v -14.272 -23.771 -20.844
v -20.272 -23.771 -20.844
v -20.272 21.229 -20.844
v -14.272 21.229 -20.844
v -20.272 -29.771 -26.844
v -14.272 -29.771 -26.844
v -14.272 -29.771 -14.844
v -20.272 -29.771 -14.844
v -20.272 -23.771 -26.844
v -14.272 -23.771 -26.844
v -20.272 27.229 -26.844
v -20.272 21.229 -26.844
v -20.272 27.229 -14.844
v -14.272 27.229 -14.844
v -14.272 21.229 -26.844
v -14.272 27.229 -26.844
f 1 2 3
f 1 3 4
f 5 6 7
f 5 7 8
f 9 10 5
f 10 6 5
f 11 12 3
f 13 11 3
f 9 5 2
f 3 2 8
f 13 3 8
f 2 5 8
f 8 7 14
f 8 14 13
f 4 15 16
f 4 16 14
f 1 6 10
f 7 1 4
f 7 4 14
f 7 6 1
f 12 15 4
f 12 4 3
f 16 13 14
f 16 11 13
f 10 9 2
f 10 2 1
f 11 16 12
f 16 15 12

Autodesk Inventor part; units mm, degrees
ref_plane "YZ Plane" through (0, 0, 0) normal (1, 0, 0) x (0, 1, 0)
ref_plane "XZ Plane" through (0, 0, 0) normal (0, 1, 0) x (-1, 0, 0)
ref_plane "XY Plane" through (0, 0, 0) normal (0, 0, 1) x (1, 0, 0)
ref_plane "Work Plane1" through (504.7277, -38.7707, -20.8442) normal (0, 0, 1) x (-1, 0, 0)
sketch "Sketch1" plane through (504.7277, -38.7707, -20.8442) normal (0, 0, 1) x (-1, 0, 0)
  line L0 (-28.8, -55.1) -> (-22.6, -55.1) projected
  line L1 (-28.8, -72) -> (-28.8, -55.1) projected
  line L2 (-28.8, -72) -> (262.8, -72) projected
  line L3 (262.8, -72) -> (262.8, -78) projected
  line L4 (262.8, -78) -> (-28.8, -78) projected
  line L5 (-28.8, -94.9) -> (-28.8, -78) projected
  line L6 (-13.3962, -94.9) -> (-28.8, -94.9) projected
  line L7 (-8.2, -97.9) -> (-13.3962, -94.9) projected
  line L8 (-8.2, -94.9) -> (-8.2, -97.9) projected
  arc A0 (-6.2, -94.9) -> (-8.2, -94.9) centre (-7.2, -94.9) ccw projected
  line L9 (-6.2, -97.9) -> (-6.2, -94.9) projected
  line L10 (-1.0038, -94.9) -> (-6.2, -97.9) projected
  line L11 (15.4038, -94.9) -> (-1.0038, -94.9) projected
  line L12 (20.6, -97.9) -> (15.4038, -94.9) projected
  line L13 (20.6, -94.9) -> (20.6, -97.9) projected
  arc A1 (22.6, -94.9) -> (20.6, -94.9) centre (21.6, -94.9) ccw projected
  line L14 (22.6, -97.9) -> (22.6, -94.9) projected
  line L15 (27.7962, -94.9) -> (22.6, -97.9) projected
  line L16 (44.2038, -94.9) -> (27.7962, -94.9) projected
  line L17 (49.4, -97.9) -> (44.2038, -94.9) projected
  line L18 (49.4, -94.9) -> (49.4, -97.9) projected
  arc A2 (51.4, -94.9) -> (49.4, -94.9) centre (50.4, -94.9) ccw projected
  line L19 (51.4, -97.9) -> (51.4, -94.9) projected
  line L20 (56.5962, -94.9) -> (51.4, -97.9) projected
  line L21 (73.0038, -94.9) -> (56.5962, -94.9) projected
  line L22 (78.2, -97.9) -> (73.0038, -94.9) projected
  line L23 (78.2, -94.9) -> (78.2, -97.9) projected
  arc A3 (80.2, -94.9) -> (78.2, -94.9) centre (79.2, -94.9) ccw projected
  line L24 (80.2, -97.9) -> (80.2, -94.9) projected
  line L25 (85.3962, -94.9) -> (80.2, -97.9) projected
  line L26 (101.8038, -94.9) -> (85.3962, -94.9) projected
  line L27 (107, -97.9) -> (101.8038, -94.9) projected
  line L28 (107, -94.9) -> (107, -97.9) projected
  arc A4 (109, -94.9) -> (107, -94.9) centre (108, -94.9) ccw projected
  line L29 (109, -97.9) -> (109, -94.9) projected
  line L30 (114.1962, -94.9) -> (109, -97.9) projected
  line L31 (130.6038, -94.9) -> (114.1962, -94.9) projected
  line L32 (135.8, -97.9) -> (130.6038, -94.9) projected
  line L33 (135.8, -94.9) -> (135.8, -97.9) projected
  arc A5 (137.8, -94.9) -> (135.8, -94.9) centre (136.8, -94.9) ccw projected
  line L34 (137.8, -97.9) -> (137.8, -94.9) projected
  line L35 (142.9962, -94.9) -> (137.8, -97.9) projected
  line L36 (159.4038, -94.9) -> (142.9962, -94.9) projected
  line L37 (164.6, -97.9) -> (159.4038, -94.9) projected
  line L38 (164.6, -94.9) -> (164.6, -97.9) projected
  arc A6 (166.6, -94.9) -> (164.6, -94.9) centre (165.6, -94.9) ccw projected
  line L39 (166.6, -97.9) -> (166.6, -94.9) projected
  line L40 (171.7962, -94.9) -> (166.6, -97.9) projected
  line L41 (188.2038, -94.9) -> (171.7962, -94.9) projected
  line L42 (193.4, -97.9) -> (188.2038, -94.9) projected
  line L43 (193.4, -94.9) -> (193.4, -97.9) projected
  arc A7 (195.4, -94.9) -> (193.4, -94.9) centre (194.4, -94.9) ccw projected
  line L44 (195.4, -97.9) -> (195.4, -94.9) projected
  line L45 (200.5962, -94.9) -> (195.4, -97.9) projected
  line L46 (217.0038, -94.9) -> (200.5962, -94.9) projected
  line L47 (222.2, -97.9) -> (217.0038, -94.9) projected
  line L48 (222.2, -94.9) -> (222.2, -97.9) projected
  arc A8 (224.2, -94.9) -> (222.2, -94.9) centre (223.2, -94.9) ccw projected
  line L49 (224.2, -97.9) -> (224.2, -94.9) projected
  line L50 (229.3962, -94.9) -> (224.2, -97.9) projected
  line L51 (245.8038, -94.9) -> (229.3962, -94.9) projected
  line L52 (251, -97.9) -> (245.8038, -94.9) projected
  line L53 (251, -94.9) -> (251, -97.9) projected
  arc A9 (253, -94.9) -> (251, -94.9) centre (252, -94.9) ccw projected
  line L54 (253, -97.9) -> (253, -94.9) projected
  line L55 (258.1962, -94.9) -> (253, -97.9) projected
  line L56 (274.6038, -94.9) -> (258.1962, -94.9) projected
  line L57 (279.8, -97.9) -> (274.6038, -94.9) projected
  line L58 (279.8, -94.9) -> (279.8, -97.9) projected
  arc A10 (281.8, -94.9) -> (279.8, -94.9) centre (280.8, -94.9) ccw projected
  line L59 (281.8, -97.9) -> (281.8, -94.9) projected
  line L60 (286.9962, -94.9) -> (281.8, -97.9) projected
  line L61 (303.4038, -94.9) -> (286.9962, -94.9) projected
  line L62 (308.6, -97.9) -> (303.4038, -94.9) projected
  line L63 (308.6, -94.9) -> (308.6, -97.9) projected
  arc A11 (310.6, -94.9) -> (308.6, -94.9) centre (309.6, -94.9) ccw projected
  line L64 (310.6, -97.9) -> (310.6, -94.9) projected
  line L65 (315.7962, -94.9) -> (310.6, -97.9) projected
  line L66 (332.2038, -94.9) -> (315.7962, -94.9) projected
  line L67 (337.4, -97.9) -> (332.2038, -94.9) projected
  line L68 (337.4, -94.9) -> (337.4, -97.9) projected
  arc A12 (339.4, -94.9) -> (337.4, -94.9) centre (338.4, -94.9) ccw projected
  line L69 (339.4, -97.9) -> (339.4, -94.9) projected
  line L70 (344.5962, -94.9) -> (339.4, -97.9) projected
  line L71 (361.0038, -94.9) -> (344.5962, -94.9) projected
  line L72 (366.2, -97.9) -> (361.0038, -94.9) projected
  line L73 (366.2, -94.9) -> (366.2, -97.9) projected
  arc A13 (368.2, -94.9) -> (366.2, -94.9) centre (367.2, -94.9) ccw projected
  line L74 (368.2, -97.9) -> (368.2, -94.9) projected
  line L75 (373.3962, -94.9) -> (368.2, -97.9) projected
  line L76 (389.8038, -94.9) -> (373.3962, -94.9) projected
  line L77 (395, -97.9) -> (389.8038, -94.9) projected
  line L78 (395, -94.9) -> (395, -97.9) projected
  arc A14 (397, -94.9) -> (395, -94.9) centre (396, -94.9) ccw projected
  line L79 (397, -97.9) -> (397, -94.9) projected
  line L80 (402.1962, -94.9) -> (397, -97.9) projected
  line L81 (418.6038, -94.9) -> (402.1962, -94.9) projected
  line L82 (423.8, -97.9) -> (418.6038, -94.9) projected
  line L83 (423.8, -94.9) -> (423.8, -97.9) projected
  arc A15 (425.8, -94.9) -> (423.8, -94.9) centre (424.8, -94.9) ccw projected
  line L84 (425.8, -97.9) -> (425.8, -94.9) projected
  line L85 (430.9962, -94.9) -> (425.8, -97.9) projected
  line L86 (447.4038, -94.9) -> (430.9962, -94.9) projected
  line L87 (452.6, -97.9) -> (447.4038, -94.9) projected
  line L88 (452.6, -94.9) -> (452.6, -97.9) projected
  arc A16 (454.6, -94.9) -> (452.6, -94.9) centre (453.6, -94.9) ccw projected
  line L89 (454.6, -97.9) -> (454.6, -94.9) projected
  line L90 (459.7962, -94.9) -> (454.6, -97.9) projected
  line L91 (476.2038, -94.9) -> (459.7962, -94.9) projected
  line L92 (481.4, -97.9) -> (476.2038, -94.9) projected
  line L93 (481.4, -94.9) -> (481.4, -97.9) projected
  arc A17 (483.4, -94.9) -> (481.4, -94.9) centre (482.4, -94.9) ccw projected
  line L94 (483.4, -97.9) -> (483.4, -94.9) projected
  line L95 (488.5962, -94.9) -> (483.4, -97.9) projected
  line L96 (505.0038, -94.9) -> (488.5962, -94.9) projected
  line L97 (510.2, -97.9) -> (505.0038, -94.9) projected
  line L98 (510.2, -94.9) -> (510.2, -97.9) projected
  arc A18 (512.2, -94.9) -> (510.2, -94.9) centre (511.2, -94.9) ccw projected
  line L99 (512.2, -97.9) -> (512.2, -94.9) projected
  line L100 (517.3962, -94.9) -> (512.2, -97.9) projected
  line L101 (533.8038, -94.9) -> (517.3962, -94.9) projected
  line L102 (539, -97.9) -> (533.8038, -94.9) projected
  line L103 (539, -94.9) -> (539, -97.9) projected
  arc A19 (541, -94.9) -> (539, -94.9) centre (540, -94.9) ccw projected
  line L104 (541, -97.9) -> (541, -94.9) projected
  line L105 (546.1962, -94.9) -> (541, -97.9) projected
  line L106 (546.1962, -94.9) -> (554.4, -94.9) projected
  line L107 (554.4, -55.1) -> (554.4, -94.9) projected
  line L108 (531.7962, -55.1) -> (554.4, -55.1) projected
  line L109 (526.6, -52.1) -> (531.7962, -55.1) projected
  line L110 (526.6, -55.1) -> (526.6, -52.1) projected
  arc A20 (524.6, -55.1) -> (526.6, -55.1) centre (525.6, -55.1) ccw projected
  line L111 (524.6, -52.1) -> (524.6, -55.1) projected
  line L112 (519.4038, -55.1) -> (524.6, -52.1) projected
  line L113 (502.9962, -55.1) -> (519.4038, -55.1) projected
  line L114 (497.8, -52.1) -> (502.9962, -55.1) projected
  line L115 (497.8, -55.1) -> (497.8, -52.1) projected
  arc A21 (495.8, -55.1) -> (497.8, -55.1) centre (496.8, -55.1) ccw projected
  line L116 (495.8, -52.1) -> (495.8, -55.1) projected
  line L117 (490.6038, -55.1) -> (495.8, -52.1) projected
  line L118 (474.1962, -55.1) -> (490.6038, -55.1) projected
  line L119 (469, -52.1) -> (474.1962, -55.1) projected
  line L120 (469, -55.1) -> (469, -52.1) projected
  arc A22 (467, -55.1) -> (469, -55.1) centre (468, -55.1) ccw projected
  line L121 (467, -52.1) -> (467, -55.1) projected
  line L122 (461.8038, -55.1) -> (467, -52.1) projected
  line L123 (445.3962, -55.1) -> (461.8038, -55.1) projected
  line L124 (440.2, -52.1) -> (445.3962, -55.1) projected
  line L125 (440.2, -55.1) -> (440.2, -52.1) projected
  arc A23 (438.2, -55.1) -> (440.2, -55.1) centre (439.2, -55.1) ccw projected
  line L126 (438.2, -52.1) -> (438.2, -55.1) projected
  line L127 (433.0038, -55.1) -> (438.2, -52.1) projected
  line L128 (416.5962, -55.1) -> (433.0038, -55.1) projected
  line L129 (411.4, -52.1) -> (416.5962, -55.1) projected
  line L130 (411.4, -55.1) -> (411.4, -52.1) projected
  arc A24 (409.4, -55.1) -> (411.4, -55.1) centre (410.4, -55.1) ccw projected
  line L131 (409.4, -52.1) -> (409.4, -55.1) projected
  line L132 (404.2038, -55.1) -> (409.4, -52.1) projected
  line L133 (387.7962, -55.1) -> (404.2038, -55.1) projected
  line L134 (382.6, -52.1) -> (387.7962, -55.1) projected
  line L135 (382.6, -55.1) -> (382.6, -52.1) projected
  arc A25 (380.6, -55.1) -> (382.6, -55.1) centre (381.6, -55.1) ccw projected
  line L136 (380.6, -52.1) -> (380.6, -55.1) projected
  line L137 (375.4038, -55.1) -> (380.6, -52.1) projected
  line L138 (358.9962, -55.1) -> (375.4038, -55.1) projected
  line L139 (353.8, -52.1) -> (358.9962, -55.1) projected
  line L140 (353.8, -55.1) -> (353.8, -52.1) projected
  arc A26 (351.8, -55.1) -> (353.8, -55.1) centre (352.8, -55.1) ccw projected
  line L141 (351.8, -52.1) -> (351.8, -55.1) projected
  line L142 (346.6038, -55.1) -> (351.8, -52.1) projected
  line L143 (330.1962, -55.1) -> (346.6038, -55.1) projected
  line L144 (325, -52.1) -> (330.1962, -55.1) projected
  line L145 (325, -55.1) -> (325, -52.1) projected
  arc A27 (323, -55.1) -> (325, -55.1) centre (324, -55.1) ccw projected
  line L146 (323, -52.1) -> (323, -55.1) projected
  line L147 (317.8038, -55.1) -> (323, -52.1) projected
  line L148 (301.3962, -55.1) -> (317.8038, -55.1) projected
  line L149 (296.2, -52.1) -> (301.3962, -55.1) projected
  line L150 (296.2, -55.1) -> (296.2, -52.1) projected
  arc A28 (294.2, -55.1) -> (296.2, -55.1) centre (295.2, -55.1) ccw projected
  line L151 (294.2, -52.1) -> (294.2, -55.1) projected
  line L152 (289.0038, -55.1) -> (294.2, -52.1) projected
  line L153 (272.5962, -55.1) -> (289.0038, -55.1) projected
  line L154 (267.4, -52.1) -> (272.5962, -55.1) projected
  line L155 (267.4, -55.1) -> (267.4, -52.1) projected
  arc A29 (265.4, -55.1) -> (267.4, -55.1) centre (266.4, -55.1) ccw projected
  line L156 (265.4, -52.1) -> (265.4, -55.1) projected
  line L157 (260.2038, -55.1) -> (265.4, -52.1) projected
  line L158 (243.7962, -55.1) -> (260.2038, -55.1) projected
  line L159 (238.6, -52.1) -> (243.7962, -55.1) projected
  line L160 (238.6, -55.1) -> (238.6, -52.1) projected
  arc A30 (236.6, -55.1) -> (238.6, -55.1) centre (237.6, -55.1) ccw projected
  line L161 (236.6, -52.1) -> (236.6, -55.1) projected
  line L162 (231.4038, -55.1) -> (236.6, -52.1) projected
  line L163 (214.9962, -55.1) -> (231.4038, -55.1) projected
  line L164 (209.8, -52.1) -> (214.9962, -55.1) projected
  line L165 (209.8, -55.1) -> (209.8, -52.1) projected
  arc A31 (207.8, -55.1) -> (209.8, -55.1) centre (208.8, -55.1) ccw projected
  line L166 (207.8, -52.1) -> (207.8, -55.1) projected
  line L167 (202.6038, -55.1) -> (207.8, -52.1) projected
  line L168 (186.1962, -55.1) -> (202.6038, -55.1) projected
  line L169 (181, -52.1) -> (186.1962, -55.1) projected
  line L170 (181, -55.1) -> (181, -52.1) projected
  arc A32 (179, -55.1) -> (181, -55.1) centre (180, -55.1) ccw projected
  line L171 (179, -52.1) -> (179, -55.1) projected
  line L172 (173.8038, -55.1) -> (179, -52.1) projected
  line L173 (157.3962, -55.1) -> (173.8038, -55.1) projected
  line L174 (152.2, -52.1) -> (157.3962, -55.1) projected
  line L175 (152.2, -55.1) -> (152.2, -52.1) projected
  arc A33 (150.2, -55.1) -> (152.2, -55.1) centre (151.2, -55.1) ccw projected
  line L176 (150.2, -52.1) -> (150.2, -55.1) projected
  line L177 (145.0038, -55.1) -> (150.2, -52.1) projected
  line L178 (128.5962, -55.1) -> (145.0038, -55.1) projected
  line L179 (123.4, -52.1) -> (128.5962, -55.1) projected
  line L180 (123.4, -55.1) -> (123.4, -52.1) projected
  arc A34 (121.4, -55.1) -> (123.4, -55.1) centre (122.4, -55.1) ccw projected
  line L181 (121.4, -52.1) -> (121.4, -55.1) projected
  line L182 (116.2038, -55.1) -> (121.4, -52.1) projected
  line L183 (99.7962, -55.1) -> (116.2038, -55.1) projected
  line L184 (94.6, -52.1) -> (99.7962, -55.1) projected
  line L185 (94.6, -55.1) -> (94.6, -52.1) projected
  arc A35 (92.6, -55.1) -> (94.6, -55.1) centre (93.6, -55.1) ccw projected
  line L186 (92.6, -52.1) -> (92.6, -55.1) projected
  line L187 (87.4038, -55.1) -> (92.6, -52.1) projected
  line L188 (70.9962, -55.1) -> (87.4038, -55.1) projected
  line L189 (65.8, -52.1) -> (70.9962, -55.1) projected
  line L190 (65.8, -55.1) -> (65.8, -52.1) projected
  arc A36 (63.8, -55.1) -> (65.8, -55.1) centre (64.8, -55.1) ccw projected
  line L191 (63.8, -52.1) -> (63.8, -55.1) projected
  line L192 (58.6038, -55.1) -> (63.8, -52.1) projected
  line L193 (42.1962, -55.1) -> (58.6038, -55.1) projected
  line L194 (37, -52.1) -> (42.1962, -55.1) projected
  line L195 (37, -55.1) -> (37, -52.1) projected
  arc A37 (35, -55.1) -> (37, -55.1) centre (36, -55.1) ccw projected
  line L196 (35, -52.1) -> (35, -55.1) projected
  line L197 (29.8038, -55.1) -> (35, -52.1) projected
  line L198 (13.3962, -55.1) -> (29.8038, -55.1) projected
  line L199 (8.2, -52.1) -> (13.3962, -55.1) projected
  line L200 (8.2, -55.1) -> (8.2, -52.1) projected
  arc A38 (6.2, -55.1) -> (8.2, -55.1) centre (7.2, -55.1) ccw projected
  line L201 (6.2, -52.1) -> (6.2, -55.1) projected
  line L202 (1.0038, -55.1) -> (6.2, -52.1) projected
  line L203 (-15.4038, -55.1) -> (1.0038, -55.1) projected
  line L204 (-20.6, -52.1) -> (-15.4038, -55.1) projected
  line L205 (-20.6, -55.1) -> (-20.6, -52.1) projected
  arc A39 (-22.6, -55.1) -> (-20.6, -55.1) centre (-21.6, -55.1) ccw projected
  line L206 (525, -66) -> (519, -66) projected
  line L207 (519, -66) -> (519, -60) projected
  line L208 (519, -60) -> (525, -60) projected
  line L209 (525, -60) -> (525, -66) projected
  line L210 (525, -84) -> (525, -90) projected
  line L211 (525, -90) -> (519, -90) projected
  line L212 (519, -90) -> (519, -84) projected
  line L213 (519, -84) -> (525, -84) projected
  line L214 (467.4, -66) -> (461.4, -66) projected
  line L215 (461.4, -66) -> (461.4, -60) projected
  line L216 (461.4, -60) -> (467.4, -60) projected
  line L217 (467.4, -60) -> (467.4, -66) projected
  line L218 (467.4, -84) -> (467.4, -90) projected
  line L219 (467.4, -90) -> (461.4, -90) projected
  line L220 (461.4, -90) -> (461.4, -84) projected
  line L221 (461.4, -84) -> (467.4, -84) projected
  line L222 (409.8, -66) -> (403.8, -66) projected
  line L223 (403.8, -66) -> (403.8, -60) projected
  line L224 (403.8, -60) -> (409.8, -60) projected
  line L225 (409.8, -60) -> (409.8, -66) projected
  line L226 (409.8, -84) -> (409.8, -90) projected
  line L227 (409.8, -90) -> (403.8, -90) projected
  line L228 (403.8, -90) -> (403.8, -84) projected
  line L229 (403.8, -84) -> (409.8, -84) projected
  line L230 (352.2, -66) -> (346.2, -66) projected
  line L231 (346.2, -66) -> (346.2, -60) projected
  line L232 (346.2, -60) -> (352.2, -60) projected
  line L233 (352.2, -60) -> (352.2, -66) projected
  line L234 (352.2, -84) -> (352.2, -90) projected
  line L235 (352.2, -90) -> (346.2, -90) projected
  line L236 (346.2, -90) -> (346.2, -84) projected
  line L237 (346.2, -84) -> (352.2, -84) projected
  line L238 (294.6, -66) -> (288.6, -66) projected
  line L239 (288.6, -66) -> (288.6, -60) projected
  line L240 (288.6, -60) -> (294.6, -60) projected
  line L241 (294.6, -60) -> (294.6, -66) projected
  line L242 (294.6, -84) -> (294.6, -90) projected
  line L243 (294.6, -90) -> (288.6, -90) projected
  line L244 (288.6, -90) -> (288.6, -84) projected
  line L245 (288.6, -84) -> (294.6, -84) projected
  line L246 (237, -66) -> (231, -66) projected
  line L247 (231, -66) -> (231, -60) projected
  line L248 (231, -60) -> (237, -60) projected
  line L249 (237, -60) -> (237, -66) projected
  line L250 (237, -84) -> (237, -90) projected
  line L251 (237, -90) -> (231, -90) projected
  line L252 (231, -90) -> (231, -84) projected
  line L253 (231, -84) -> (237, -84) projected
  line L254 (179.4, -66) -> (173.4, -66) projected
  line L255 (173.4, -66) -> (173.4, -60) projected
  line L256 (173.4, -60) -> (179.4, -60) projected
  line L257 (179.4, -60) -> (179.4, -66) projected
  line L258 (179.4, -84) -> (179.4, -90) projected
  line L259 (179.4, -90) -> (173.4, -90) projected
  line L260 (173.4, -90) -> (173.4, -84) projected
  line L261 (173.4, -84) -> (179.4, -84) projected
  line L262 (121.8, -66) -> (115.8, -66) projected
  line L263 (115.8, -66) -> (115.8, -60) projected
  line L264 (115.8, -60) -> (121.8, -60) projected
  line L265 (121.8, -60) -> (121.8, -66) projected
  line L266 (121.8, -84) -> (121.8, -90) projected
  line L267 (121.8, -90) -> (115.8, -90) projected
  line L268 (115.8, -90) -> (115.8, -84) projected
  line L269 (115.8, -84) -> (121.8, -84) projected
  line L270 (64.2, -66) -> (58.2, -66) projected
  line L271 (58.2, -66) -> (58.2, -60) projected
  line L272 (58.2, -60) -> (64.2, -60) projected
  line L273 (64.2, -60) -> (64.2, -66) projected
  line L274 (64.2, -84) -> (64.2, -90) projected
  line L275 (64.2, -90) -> (58.2, -90) projected
  line L276 (58.2, -90) -> (58.2, -84) projected
  line L277 (58.2, -84) -> (64.2, -84) projected
  line L278 (6.6, -66) -> (0.6, -66) projected
  line L279 (0.6, -66) -> (0.6, -60) projected
  line L280 (0.6, -60) -> (6.6, -60) projected
  line L281 (6.6, -60) -> (6.6, -66) projected
  line L282 (6.6, -84) -> (6.6, -90) projected
  line L283 (6.6, -90) -> (0.6, -90) projected
  line L284 (0.6, -90) -> (0.6, -84) projected
  line L285 (0.6, -84) -> (6.6, -84) projected
  line L286 (-28.8, 19.9) -> (-22.6, 19.9) projected
  line L287 (-28.8, 3) -> (-28.8, 19.9) projected
  line L288 (-28.8, 3) -> (262.8, 3) projected
  line L289 (262.8, 3) -> (262.8, -3) projected
  line L290 (262.8, -3) -> (-28.8, -3) projected
  line L291 (-28.8, -19.9) -> (-28.8, -3) projected
  line L292 (-13.3962, -19.9) -> (-28.8, -19.9) projected
  line L293 (-8.2, -22.9) -> (-13.3962, -19.9) projected
  line L294 (-8.2, -19.9) -> (-8.2, -22.9) projected
  arc A40 (-6.2, -19.9) -> (-8.2, -19.9) centre (-7.2, -19.9) ccw projected
  line L295 (-6.2, -22.9) -> (-6.2, -19.9) projected
  line L296 (-1.0038, -19.9) -> (-6.2, -22.9) projected
  line L297 (15.4038, -19.9) -> (-1.0038, -19.9) projected
  line L298 (20.6, -22.9) -> (15.4038, -19.9) projected
  line L299 (20.6, -19.9) -> (20.6, -22.9) projected
  arc A41 (22.6, -19.9) -> (20.6, -19.9) centre (21.6, -19.9) ccw projected
  line L300 (22.6, -22.9) -> (22.6, -19.9) projected
  line L301 (27.7962, -19.9) -> (22.6, -22.9) projected
  line L302 (44.2038, -19.9) -> (27.7962, -19.9) projected
  line L303 (49.4, -22.9) -> (44.2038, -19.9) projected
  line L304 (49.4, -19.9) -> (49.4, -22.9) projected
  arc A42 (51.4, -19.9) -> (49.4, -19.9) centre (50.4, -19.9) ccw projected
  line L305 (51.4, -22.9) -> (51.4, -19.9) projected
  line L306 (56.5962, -19.9) -> (51.4, -22.9) projected
  line L307 (73.0038, -19.9) -> (56.5962, -19.9) projected
  line L308 (78.2, -22.9) -> (73.0038, -19.9) projected
  line L309 (78.2, -19.9) -> (78.2, -22.9) projected
  arc A43 (80.2, -19.9) -> (78.2, -19.9) centre (79.2, -19.9) ccw projected
  line L310 (80.2, -22.9) -> (80.2, -19.9) projected
  line L311 (85.3962, -19.9) -> (80.2, -22.9) projected
  line L312 (101.8038, -19.9) -> (85.3962, -19.9) projected
  line L313 (107, -22.9) -> (101.8038, -19.9) projected
  line L314 (107, -19.9) -> (107, -22.9) projected
  arc A44 (109, -19.9) -> (107, -19.9) centre (108, -19.9) ccw projected
  line L315 (109, -22.9) -> (109, -19.9) projected
  line L316 (114.1962, -19.9) -> (109, -22.9) projected
  line L317 (130.6038, -19.9) -> (114.1962, -19.9) projected
  line L318 (135.8, -22.9) -> (130.6038, -19.9) projected
  line L319 (135.8, -19.9) -> (135.8, -22.9) projected
  arc A45 (137.8, -19.9) -> (135.8, -19.9) centre (136.8, -19.9) ccw projected
  line L320 (137.8, -22.9) -> (137.8, -19.9) projected
  line L321 (142.9962, -19.9) -> (137.8, -22.9) projected
  line L322 (159.4038, -19.9) -> (142.9962, -19.9) projected
  line L323 (164.6, -22.9) -> (159.4038, -19.9) projected
  line L324 (164.6, -19.9) -> (164.6, -22.9) projected
  arc A46 (166.6, -19.9) -> (164.6, -19.9) centre (165.6, -19.9) ccw projected
  line L325 (166.6, -22.9) -> (166.6, -19.9) projected
  line L326 (171.7962, -19.9) -> (166.6, -22.9) projected
  line L327 (188.2038, -19.9) -> (171.7962, -19.9) projected
  line L328 (193.4, -22.9) -> (188.2038, -19.9) projected
  line L329 (193.4, -19.9) -> (193.4, -22.9) projected
  arc A47 (195.4, -19.9) -> (193.4, -19.9) centre (194.4, -19.9) ccw projected
  line L330 (195.4, -22.9) -> (195.4, -19.9) projected
  line L331 (200.5962, -19.9) -> (195.4, -22.9) projected
  line L332 (217.0038, -19.9) -> (200.5962, -19.9) projected
  line L333 (222.2, -22.9) -> (217.0038, -19.9) projected
  line L334 (222.2, -19.9) -> (222.2, -22.9) projected
  arc A48 (224.2, -19.9) -> (222.2, -19.9) centre (223.2, -19.9) ccw projected
  line L335 (224.2, -22.9) -> (224.2, -19.9) projected
  line L336 (229.3962, -19.9) -> (224.2, -22.9) projected
  line L337 (245.8038, -19.9) -> (229.3962, -19.9) projected
  line L338 (251, -22.9) -> (245.8038, -19.9) projected
  line L339 (251, -19.9) -> (251, -22.9) projected
  arc A49 (253, -19.9) -> (251, -19.9) centre (252, -19.9) ccw projected
  line L340 (253, -22.9) -> (253, -19.9) projected
  line L341 (258.1962, -19.9) -> (253, -22.9) projected
  line L342 (274.6038, -19.9) -> (258.1962, -19.9) projected
  line L343 (279.8, -22.9) -> (274.6038, -19.9) projected
  line L344 (279.8, -19.9) -> (279.8, -22.9) projected
  arc A50 (281.8, -19.9) -> (279.8, -19.9) centre (280.8, -19.9) ccw projected
  line L345 (281.8, -22.9) -> (281.8, -19.9) projected
  line L346 (286.9962, -19.9) -> (281.8, -22.9) projected
  line L347 (303.4038, -19.9) -> (286.9962, -19.9) projected
  line L348 (308.6, -22.9) -> (303.4038, -19.9) projected
  line L349 (308.6, -19.9) -> (308.6, -22.9) projected
  arc A51 (310.6, -19.9) -> (308.6, -19.9) centre (309.6, -19.9) ccw projected
  line L350 (310.6, -22.9) -> (310.6, -19.9) projected
  line L351 (315.7962, -19.9) -> (310.6, -22.9) projected
  line L352 (332.2038, -19.9) -> (315.7962, -19.9) projected
  line L353 (337.4, -22.9) -> (332.2038, -19.9) projected
  line L354 (337.4, -19.9) -> (337.4, -22.9) projected
  arc A52 (339.4, -19.9) -> (337.4, -19.9) centre (338.4, -19.9) ccw projected
  line L355 (339.4, -22.9) -> (339.4, -19.9) projected
  line L356 (344.5962, -19.9) -> (339.4, -22.9) projected
  line L357 (361.0038, -19.9) -> (344.5962, -19.9) projected
  line L358 (366.2, -22.9) -> (361.0038, -19.9) projected
  line L359 (366.2, -19.9) -> (366.2, -22.9) projected
  arc A53 (368.2, -19.9) -> (366.2, -19.9) centre (367.2, -19.9) ccw projected
  line L360 (368.2, -22.9) -> (368.2, -19.9) projected
  line L361 (373.3962, -19.9) -> (368.2, -22.9) projected
  line L362 (389.8038, -19.9) -> (373.3962, -19.9) projected
  line L363 (395, -22.9) -> (389.8038, -19.9) projected
  line L364 (395, -19.9) -> (395, -22.9) projected
  arc A54 (397, -19.9) -> (395, -19.9) centre (396, -19.9) ccw projected
  line L365 (397, -22.9) -> (397, -19.9) projected
  line L366 (402.1962, -19.9) -> (397, -22.9) projected
  line L367 (418.6038, -19.9) -> (402.1962, -19.9) projected
  line L368 (423.8, -22.9) -> (418.6038, -19.9) projected
  line L369 (423.8, -19.9) -> (423.8, -22.9) projected
  arc A55 (425.8, -19.9) -> (423.8, -19.9) centre (424.8, -19.9) ccw projected
  line L370 (425.8, -22.9) -> (425.8, -19.9) projected
  line L371 (430.9962, -19.9) -> (425.8, -22.9) projected
  line L372 (447.4038, -19.9) -> (430.9962, -19.9) projected
  line L373 (452.6, -22.9) -> (447.4038, -19.9) projected
  line L374 (452.6, -19.9) -> (452.6, -22.9) projected
  arc A56 (454.6, -19.9) -> (452.6, -19.9) centre (453.6, -19.9) ccw projected
  line L375 (454.6, -22.9) -> (454.6, -19.9) projected
  line L376 (459.7962, -19.9) -> (454.6, -22.9) projected
  line L377 (476.2038, -19.9) -> (459.7962, -19.9) projected
  line L378 (481.4, -22.9) -> (476.2038, -19.9) projected
  line L379 (481.4, -19.9) -> (481.4, -22.9) projected
  arc A57 (483.4, -19.9) -> (481.4, -19.9) centre (482.4, -19.9) ccw projected
  line L380 (483.4, -22.9) -> (483.4, -19.9) projected
  line L381 (488.5962, -19.9) -> (483.4, -22.9) projected
  line L382 (505.0038, -19.9) -> (488.5962, -19.9) projected
  line L383 (510.2, -22.9) -> (505.0038, -19.9) projected
  line L384 (510.2, -19.9) -> (510.2, -22.9) projected
  arc A58 (512.2, -19.9) -> (510.2, -19.9) centre (511.2, -19.9) ccw projected
  line L385 (512.2, -22.9) -> (512.2, -19.9) projected
  line L386 (517.3962, -19.9) -> (512.2, -22.9) projected
  line L387 (533.8038, -19.9) -> (517.3962, -19.9) projected
  line L388 (539, -22.9) -> (533.8038, -19.9) projected
  line L389 (539, -19.9) -> (539, -22.9) projected
  arc A59 (541, -19.9) -> (539, -19.9) centre (540, -19.9) ccw projected
  line L390 (541, -22.9) -> (541, -19.9) projected
  line L391 (546.1962, -19.9) -> (541, -22.9) projected
  line L392 (546.1962, -19.9) -> (554.4, -19.9) projected
  line L393 (554.4, 19.9) -> (554.4, -19.9) projected
  line L394 (531.7962, 19.9) -> (554.4, 19.9) projected
  line L395 (526.6, 22.9) -> (531.7962, 19.9) projected
  line L396 (526.6, 19.9) -> (526.6, 22.9) projected
  arc A60 (524.6, 19.9) -> (526.6, 19.9) centre (525.6, 19.9) ccw projected
  line L397 (524.6, 22.9) -> (524.6, 19.9) projected
  line L398 (519.4038, 19.9) -> (524.6, 22.9) projected
  line L399 (502.9962, 19.9) -> (519.4038, 19.9) projected
  line L400 (497.8, 22.9) -> (502.9962, 19.9) projected
  line L401 (497.8, 19.9) -> (497.8, 22.9) projected
  arc A61 (495.8, 19.9) -> (497.8, 19.9) centre (496.8, 19.9) ccw projected
  line L402 (495.8, 22.9) -> (495.8, 19.9) projected
  line L403 (490.6038, 19.9) -> (495.8, 22.9) projected
  line L404 (474.1962, 19.9) -> (490.6038, 19.9) projected
  line L405 (469, 22.9) -> (474.1962, 19.9) projected
  line L406 (469, 19.9) -> (469, 22.9) projected
  arc A62 (467, 19.9) -> (469, 19.9) centre (468, 19.9) ccw projected
  line L407 (467, 22.9) -> (467, 19.9) projected
  line L408 (461.8038, 19.9) -> (467, 22.9) projected
  line L409 (445.3962, 19.9) -> (461.8038, 19.9) projected
  line L410 (440.2, 22.9) -> (445.3962, 19.9) projected
  line L411 (440.2, 19.9) -> (440.2, 22.9) projected
  arc A63 (438.2, 19.9) -> (440.2, 19.9) centre (439.2, 19.9) ccw projected
  line L412 (438.2, 22.9) -> (438.2, 19.9) projected
  line L413 (433.0038, 19.9) -> (438.2, 22.9) projected
  line L414 (416.5962, 19.9) -> (433.0038, 19.9) projected
  line L415 (411.4, 22.9) -> (416.5962, 19.9) projected
  line L416 (411.4, 19.9) -> (411.4, 22.9) projected
  arc A64 (409.4, 19.9) -> (411.4, 19.9) centre (410.4, 19.9) ccw projected
  line L417 (409.4, 22.9) -> (409.4, 19.9) projected
  line L418 (404.2038, 19.9) -> (409.4, 22.9) projected
  line L419 (387.7962, 19.9) -> (404.2038, 19.9) projected
  line L420 (382.6, 22.9) -> (387.7962, 19.9) projected
  line L421 (382.6, 19.9) -> (382.6, 22.9) projected
  arc A65 (380.6, 19.9) -> (382.6, 19.9) centre (381.6, 19.9) ccw projected
  line L422 (380.6, 22.9) -> (380.6, 19.9) projected
  line L423 (375.4038, 19.9) -> (380.6, 22.9) projected
  line L424 (358.9962, 19.9) -> (375.4038, 19.9) projected
  line L425 (353.8, 22.9) -> (358.9962, 19.9) projected
  line L426 (353.8, 19.9) -> (353.8, 22.9) projected
  arc A66 (351.8, 19.9) -> (353.8, 19.9) centre (352.8, 19.9) ccw projected
  line L427 (351.8, 22.9) -> (351.8, 19.9) projected
  line L428 (346.6038, 19.9) -> (351.8, 22.9) projected
  line L429 (330.1962, 19.9) -> (346.6038, 19.9) projected
  line L430 (325, 22.9) -> (330.1962, 19.9) projected
  line L431 (325, 19.9) -> (325, 22.9) projected
  arc A67 (323, 19.9) -> (325, 19.9) centre (324, 19.9) ccw projected
  line L432 (323, 22.9) -> (323, 19.9) projected
  line L433 (317.8038, 19.9) -> (323, 22.9) projected
  line L434 (301.3962, 19.9) -> (317.8038, 19.9) projected
  line L435 (296.2, 22.9) -> (301.3962, 19.9) projected
  line L436 (296.2, 19.9) -> (296.2, 22.9) projected
  arc A68 (294.2, 19.9) -> (296.2, 19.9) centre (295.2, 19.9) ccw projected
  line L437 (294.2, 22.9) -> (294.2, 19.9) projected
  line L438 (289.0038, 19.9) -> (294.2, 22.9) projected
  line L439 (272.5962, 19.9) -> (289.0038, 19.9) projected
  line L440 (267.4, 22.9) -> (272.5962, 19.9) projected
  line L441 (267.4, 19.9) -> (267.4, 22.9) projected
  arc A69 (265.4, 19.9) -> (267.4, 19.9) centre (266.4, 19.9) ccw projected
  line L442 (265.4, 22.9) -> (265.4, 19.9) projected
  line L443 (260.2038, 19.9) -> (265.4, 22.9) projected
  line L444 (243.7962, 19.9) -> (260.2038, 19.9) projected
  line L445 (238.6, 22.9) -> (243.7962, 19.9) projected
  line L446 (238.6, 19.9) -> (238.6, 22.9) projected
  arc A70 (236.6, 19.9) -> (238.6, 19.9) centre (237.6, 19.9) ccw projected
  line L447 (236.6, 22.9) -> (236.6, 19.9) projected
  line L448 (231.4038, 19.9) -> (236.6, 22.9) projected
  line L449 (214.9962, 19.9) -> (231.4038, 19.9) projected
  line L450 (209.8, 22.9) -> (214.9962, 19.9) projected
  line L451 (209.8, 19.9) -> (209.8, 22.9) projected
  arc A71 (207.8, 19.9) -> (209.8, 19.9) centre (208.8, 19.9) ccw projected
  line L452 (207.8, 22.9) -> (207.8, 19.9) projected
  line L453 (202.6038, 19.9) -> (207.8, 22.9) projected
  line L454 (186.1962, 19.9) -> (202.6038, 19.9) projected
  line L455 (181, 22.9) -> (186.1962, 19.9) projected
  line L456 (181, 19.9) -> (181, 22.9) projected
  arc A72 (179, 19.9) -> (181, 19.9) centre (180, 19.9) ccw projected
  line L457 (179, 22.9) -> (179, 19.9) projected
  line L458 (173.8038, 19.9) -> (179, 22.9) projected
  line L459 (157.3962, 19.9) -> (173.8038, 19.9) projected
  line L460 (152.2, 22.9) -> (157.3962, 19.9) projected
  line L461 (152.2, 19.9) -> (152.2, 22.9) projected
  arc A73 (150.2, 19.9) -> (152.2, 19.9) centre (151.2, 19.9) ccw projected
  line L462 (150.2, 22.9) -> (150.2, 19.9) projected
  line L463 (145.0038, 19.9) -> (150.2, 22.9) projected
  line L464 (128.5962, 19.9) -> (145.0038, 19.9) projected
  line L465 (123.4, 22.9) -> (128.5962, 19.9) projected
  line L466 (123.4, 19.9) -> (123.4, 22.9) projected
  arc A74 (121.4, 19.9) -> (123.4, 19.9) centre (122.4, 19.9) ccw projected
  line L467 (121.4, 22.9) -> (121.4, 19.9) projected
  line L468 (116.2038, 19.9) -> (121.4, 22.9) projected
  line L469 (99.7962, 19.9) -> (116.2038, 19.9) projected
  line L470 (94.6, 22.9) -> (99.7962, 19.9) projected
  line L471 (94.6, 19.9) -> (94.6, 22.9) projected
  arc A75 (92.6, 19.9) -> (94.6, 19.9) centre (93.6, 19.9) ccw projected
  line L472 (92.6, 22.9) -> (92.6, 19.9) projected
  line L473 (87.4038, 19.9) -> (92.6, 22.9) projected
  line L474 (70.9962, 19.9) -> (87.4038, 19.9) projected
  line L475 (65.8, 22.9) -> (70.9962, 19.9) projected
  line L476 (65.8, 19.9) -> (65.8, 22.9) projected
  arc A76 (63.8, 19.9) -> (65.8, 19.9) centre (64.8, 19.9) ccw projected
  line L477 (63.8, 22.9) -> (63.8, 19.9) projected
  line L478 (58.6038, 19.9) -> (63.8, 22.9) projected
  line L479 (42.1962, 19.9) -> (58.6038, 19.9) projected
  line L480 (37, 22.9) -> (42.1962, 19.9) projected
  line L481 (37, 19.9) -> (37, 22.9) projected
  arc A77 (35, 19.9) -> (37, 19.9) centre (36, 19.9) ccw projected
  line L482 (35, 22.9) -> (35, 19.9) projected
  line L483 (29.8038, 19.9) -> (35, 22.9) projected
  line L484 (13.3962, 19.9) -> (29.8038, 19.9) projected
  line L485 (8.2, 22.9) -> (13.3962, 19.9) projected
  line L486 (8.2, 19.9) -> (8.2, 22.9) projected
  arc A78 (6.2, 19.9) -> (8.2, 19.9) centre (7.2, 19.9) ccw projected
  line L487 (6.2, 22.9) -> (6.2, 19.9) projected
  line L488 (1.0038, 19.9) -> (6.2, 22.9) projected
  line L489 (-15.4038, 19.9) -> (1.0038, 19.9) projected
  line L490 (-20.6, 22.9) -> (-15.4038, 19.9) projected
  line L491 (-20.6, 19.9) -> (-20.6, 22.9) projected
  arc A79 (-22.6, 19.9) -> (-20.6, 19.9) centre (-21.6, 19.9) ccw projected
  line L492 (525, 9) -> (519, 9) projected
  line L493 (519, 9) -> (519, 15) projected
  line L494 (519, 15) -> (525, 15) projected
  line L495 (525, 15) -> (525, 9) projected
  line L496 (525, -9) -> (525, -15) projected
  line L497 (525, -15) -> (519, -15) projected
  line L498 (519, -15) -> (519, -9) projected
  line L499 (519, -9) -> (525, -9) projected
  line L500 (467.4, 9) -> (461.4, 9) projected
  line L501 (461.4, 9) -> (461.4, 15) projected
  line L502 (461.4, 15) -> (467.4, 15) projected
  line L503 (467.4, 15) -> (467.4, 9) projected
  line L504 (467.4, -9) -> (467.4, -15) projected
  line L505 (467.4, -15) -> (461.4, -15) projected
  line L506 (461.4, -15) -> (461.4, -9) projected
  line L507 (461.4, -9) -> (467.4, -9) projected
  line L508 (409.8, 9) -> (403.8, 9) projected
  line L509 (403.8, 9) -> (403.8, 15) projected
  line L510 (403.8, 15) -> (409.8, 15) projected
  line L511 (409.8, 15) -> (409.8, 9) projected
  line L512 (409.8, -9) -> (409.8, -15) projected
  line L513 (409.8, -15) -> (403.8, -15) projected
  line L514 (403.8, -15) -> (403.8, -9) projected
  line L515 (403.8, -9) -> (409.8, -9) projected
  line L516 (352.2, 9) -> (346.2, 9) projected
  line L517 (346.2, 9) -> (346.2, 15) projected
  line L518 (346.2, 15) -> (352.2, 15) projected
  line L519 (352.2, 15) -> (352.2, 9) projected
  line L520 (352.2, -9) -> (352.2, -15) projected
  line L521 (352.2, -15) -> (346.2, -15) projected
  line L522 (346.2, -15) -> (346.2, -9) projected
  line L523 (346.2, -9) -> (352.2, -9) projected
  line L524 (294.6, 9) -> (288.6, 9) projected
  line L525 (288.6, 9) -> (288.6, 15) projected
  line L526 (288.6, 15) -> (294.6, 15) projected
  line L527 (294.6, 15) -> (294.6, 9) projected
  line L528 (294.6, -9) -> (294.6, -15) projected
  line L529 (294.6, -15) -> (288.6, -15) projected
  line L530 (288.6, -15) -> (288.6, -9) projected
  line L531 (288.6, -9) -> (294.6, -9) projected
  line L532 (237, 9) -> (231, 9) projected
  line L533 (231, 9) -> (231, 15) projected
  line L534 (231, 15) -> (237, 15) projected
  line L535 (237, 15) -> (237, 9) projected
  line L536 (237, -9) -> (237, -15) projected
  line L537 (237, -15) -> (231, -15) projected
  line L538 (231, -15) -> (231, -9) projected
  line L539 (231, -9) -> (237, -9) projected
  line L540 (179.4, 9) -> (173.4, 9) projected
  line L541 (173.4, 9) -> (173.4, 15) projected
  line L542 (173.4, 15) -> (179.4, 15) projected
  line L543 (179.4, 15) -> (179.4, 9) projected
  line L544 (179.4, -9) -> (179.4, -15) projected
  line L545 (179.4, -15) -> (173.4, -15) projected
  line L546 (173.4, -15) -> (173.4, -9) projected
  line L547 (173.4, -9) -> (179.4, -9) projected
  line L548 (121.8, 9) -> (115.8, 9) projected
  line L549 (115.8, 9) -> (115.8, 15) projected
  line L550 (115.8, 15) -> (121.8, 15) projected
  line L551 (121.8, 15) -> (121.8, 9) projected
  line L552 (121.8, -9) -> (121.8, -15) projected
  line L553 (121.8, -15) -> (115.8, -15) projected
  line L554 (115.8, -15) -> (115.8, -9) projected
  line L555 (115.8, -9) -> (121.8, -9) projected
  line L556 (64.2, 9) -> (58.2, 9) projected
  line L557 (58.2, 9) -> (58.2, 15) projected
  line L558 (58.2, 15) -> (64.2, 15) projected
  line L559 (64.2, 15) -> (64.2, 9) projected
  line L560 (64.2, -9) -> (64.2, -15) projected
  line L561 (64.2, -15) -> (58.2, -15) projected
  line L562 (58.2, -15) -> (58.2, -9) projected
  line L563 (58.2, -9) -> (64.2, -9) projected
  line L564 (6.6, 9) -> (0.6, 9) projected
  line L565 (0.6, 9) -> (0.6, 15) projected
  line L566 (0.6, 15) -> (6.6, 15) projected
  line L567 (6.6, 15) -> (6.6, 9) projected
  line L568 (6.6, -9) -> (6.6, -15) projected
  line L569 (6.6, -15) -> (0.6, -15) projected
  line L570 (0.6, -15) -> (0.6, -9) projected
  line L571 (0.6, -9) -> (6.6, -9) projected
  point P0 (504.7277, -38.7707)
extrude "Extrusion1" add sketch "Sketch1" along normal mid plane 12 contours L206 L207 L208 L209 | L496 L497 L498 L499
sketch "Sketch2" plane through (-20.2723, -23.7707, -14.8442) normal (0, 1, 0) x (1, 0, 0)
  line L0 (0, 12) -> (0, 0) projected
  line L1 (6, 12) -> (6, 0) projected
  line L2 (0, 6) -> (6, 6)
  line L3 (6, 6) -> (6, 0)
  line L4 (6, 0) -> (0, 0)
  line L5 (0, 0) -> (0, 6)
  point P0 (20.2723, -14.8442)
  point P1 (0, 0)
  point P2 (6, 6)
extrude "Extrusion2" add sketch "Sketch2" along normal up to surface (45 mm away)
properties part number "Reinforcer"
